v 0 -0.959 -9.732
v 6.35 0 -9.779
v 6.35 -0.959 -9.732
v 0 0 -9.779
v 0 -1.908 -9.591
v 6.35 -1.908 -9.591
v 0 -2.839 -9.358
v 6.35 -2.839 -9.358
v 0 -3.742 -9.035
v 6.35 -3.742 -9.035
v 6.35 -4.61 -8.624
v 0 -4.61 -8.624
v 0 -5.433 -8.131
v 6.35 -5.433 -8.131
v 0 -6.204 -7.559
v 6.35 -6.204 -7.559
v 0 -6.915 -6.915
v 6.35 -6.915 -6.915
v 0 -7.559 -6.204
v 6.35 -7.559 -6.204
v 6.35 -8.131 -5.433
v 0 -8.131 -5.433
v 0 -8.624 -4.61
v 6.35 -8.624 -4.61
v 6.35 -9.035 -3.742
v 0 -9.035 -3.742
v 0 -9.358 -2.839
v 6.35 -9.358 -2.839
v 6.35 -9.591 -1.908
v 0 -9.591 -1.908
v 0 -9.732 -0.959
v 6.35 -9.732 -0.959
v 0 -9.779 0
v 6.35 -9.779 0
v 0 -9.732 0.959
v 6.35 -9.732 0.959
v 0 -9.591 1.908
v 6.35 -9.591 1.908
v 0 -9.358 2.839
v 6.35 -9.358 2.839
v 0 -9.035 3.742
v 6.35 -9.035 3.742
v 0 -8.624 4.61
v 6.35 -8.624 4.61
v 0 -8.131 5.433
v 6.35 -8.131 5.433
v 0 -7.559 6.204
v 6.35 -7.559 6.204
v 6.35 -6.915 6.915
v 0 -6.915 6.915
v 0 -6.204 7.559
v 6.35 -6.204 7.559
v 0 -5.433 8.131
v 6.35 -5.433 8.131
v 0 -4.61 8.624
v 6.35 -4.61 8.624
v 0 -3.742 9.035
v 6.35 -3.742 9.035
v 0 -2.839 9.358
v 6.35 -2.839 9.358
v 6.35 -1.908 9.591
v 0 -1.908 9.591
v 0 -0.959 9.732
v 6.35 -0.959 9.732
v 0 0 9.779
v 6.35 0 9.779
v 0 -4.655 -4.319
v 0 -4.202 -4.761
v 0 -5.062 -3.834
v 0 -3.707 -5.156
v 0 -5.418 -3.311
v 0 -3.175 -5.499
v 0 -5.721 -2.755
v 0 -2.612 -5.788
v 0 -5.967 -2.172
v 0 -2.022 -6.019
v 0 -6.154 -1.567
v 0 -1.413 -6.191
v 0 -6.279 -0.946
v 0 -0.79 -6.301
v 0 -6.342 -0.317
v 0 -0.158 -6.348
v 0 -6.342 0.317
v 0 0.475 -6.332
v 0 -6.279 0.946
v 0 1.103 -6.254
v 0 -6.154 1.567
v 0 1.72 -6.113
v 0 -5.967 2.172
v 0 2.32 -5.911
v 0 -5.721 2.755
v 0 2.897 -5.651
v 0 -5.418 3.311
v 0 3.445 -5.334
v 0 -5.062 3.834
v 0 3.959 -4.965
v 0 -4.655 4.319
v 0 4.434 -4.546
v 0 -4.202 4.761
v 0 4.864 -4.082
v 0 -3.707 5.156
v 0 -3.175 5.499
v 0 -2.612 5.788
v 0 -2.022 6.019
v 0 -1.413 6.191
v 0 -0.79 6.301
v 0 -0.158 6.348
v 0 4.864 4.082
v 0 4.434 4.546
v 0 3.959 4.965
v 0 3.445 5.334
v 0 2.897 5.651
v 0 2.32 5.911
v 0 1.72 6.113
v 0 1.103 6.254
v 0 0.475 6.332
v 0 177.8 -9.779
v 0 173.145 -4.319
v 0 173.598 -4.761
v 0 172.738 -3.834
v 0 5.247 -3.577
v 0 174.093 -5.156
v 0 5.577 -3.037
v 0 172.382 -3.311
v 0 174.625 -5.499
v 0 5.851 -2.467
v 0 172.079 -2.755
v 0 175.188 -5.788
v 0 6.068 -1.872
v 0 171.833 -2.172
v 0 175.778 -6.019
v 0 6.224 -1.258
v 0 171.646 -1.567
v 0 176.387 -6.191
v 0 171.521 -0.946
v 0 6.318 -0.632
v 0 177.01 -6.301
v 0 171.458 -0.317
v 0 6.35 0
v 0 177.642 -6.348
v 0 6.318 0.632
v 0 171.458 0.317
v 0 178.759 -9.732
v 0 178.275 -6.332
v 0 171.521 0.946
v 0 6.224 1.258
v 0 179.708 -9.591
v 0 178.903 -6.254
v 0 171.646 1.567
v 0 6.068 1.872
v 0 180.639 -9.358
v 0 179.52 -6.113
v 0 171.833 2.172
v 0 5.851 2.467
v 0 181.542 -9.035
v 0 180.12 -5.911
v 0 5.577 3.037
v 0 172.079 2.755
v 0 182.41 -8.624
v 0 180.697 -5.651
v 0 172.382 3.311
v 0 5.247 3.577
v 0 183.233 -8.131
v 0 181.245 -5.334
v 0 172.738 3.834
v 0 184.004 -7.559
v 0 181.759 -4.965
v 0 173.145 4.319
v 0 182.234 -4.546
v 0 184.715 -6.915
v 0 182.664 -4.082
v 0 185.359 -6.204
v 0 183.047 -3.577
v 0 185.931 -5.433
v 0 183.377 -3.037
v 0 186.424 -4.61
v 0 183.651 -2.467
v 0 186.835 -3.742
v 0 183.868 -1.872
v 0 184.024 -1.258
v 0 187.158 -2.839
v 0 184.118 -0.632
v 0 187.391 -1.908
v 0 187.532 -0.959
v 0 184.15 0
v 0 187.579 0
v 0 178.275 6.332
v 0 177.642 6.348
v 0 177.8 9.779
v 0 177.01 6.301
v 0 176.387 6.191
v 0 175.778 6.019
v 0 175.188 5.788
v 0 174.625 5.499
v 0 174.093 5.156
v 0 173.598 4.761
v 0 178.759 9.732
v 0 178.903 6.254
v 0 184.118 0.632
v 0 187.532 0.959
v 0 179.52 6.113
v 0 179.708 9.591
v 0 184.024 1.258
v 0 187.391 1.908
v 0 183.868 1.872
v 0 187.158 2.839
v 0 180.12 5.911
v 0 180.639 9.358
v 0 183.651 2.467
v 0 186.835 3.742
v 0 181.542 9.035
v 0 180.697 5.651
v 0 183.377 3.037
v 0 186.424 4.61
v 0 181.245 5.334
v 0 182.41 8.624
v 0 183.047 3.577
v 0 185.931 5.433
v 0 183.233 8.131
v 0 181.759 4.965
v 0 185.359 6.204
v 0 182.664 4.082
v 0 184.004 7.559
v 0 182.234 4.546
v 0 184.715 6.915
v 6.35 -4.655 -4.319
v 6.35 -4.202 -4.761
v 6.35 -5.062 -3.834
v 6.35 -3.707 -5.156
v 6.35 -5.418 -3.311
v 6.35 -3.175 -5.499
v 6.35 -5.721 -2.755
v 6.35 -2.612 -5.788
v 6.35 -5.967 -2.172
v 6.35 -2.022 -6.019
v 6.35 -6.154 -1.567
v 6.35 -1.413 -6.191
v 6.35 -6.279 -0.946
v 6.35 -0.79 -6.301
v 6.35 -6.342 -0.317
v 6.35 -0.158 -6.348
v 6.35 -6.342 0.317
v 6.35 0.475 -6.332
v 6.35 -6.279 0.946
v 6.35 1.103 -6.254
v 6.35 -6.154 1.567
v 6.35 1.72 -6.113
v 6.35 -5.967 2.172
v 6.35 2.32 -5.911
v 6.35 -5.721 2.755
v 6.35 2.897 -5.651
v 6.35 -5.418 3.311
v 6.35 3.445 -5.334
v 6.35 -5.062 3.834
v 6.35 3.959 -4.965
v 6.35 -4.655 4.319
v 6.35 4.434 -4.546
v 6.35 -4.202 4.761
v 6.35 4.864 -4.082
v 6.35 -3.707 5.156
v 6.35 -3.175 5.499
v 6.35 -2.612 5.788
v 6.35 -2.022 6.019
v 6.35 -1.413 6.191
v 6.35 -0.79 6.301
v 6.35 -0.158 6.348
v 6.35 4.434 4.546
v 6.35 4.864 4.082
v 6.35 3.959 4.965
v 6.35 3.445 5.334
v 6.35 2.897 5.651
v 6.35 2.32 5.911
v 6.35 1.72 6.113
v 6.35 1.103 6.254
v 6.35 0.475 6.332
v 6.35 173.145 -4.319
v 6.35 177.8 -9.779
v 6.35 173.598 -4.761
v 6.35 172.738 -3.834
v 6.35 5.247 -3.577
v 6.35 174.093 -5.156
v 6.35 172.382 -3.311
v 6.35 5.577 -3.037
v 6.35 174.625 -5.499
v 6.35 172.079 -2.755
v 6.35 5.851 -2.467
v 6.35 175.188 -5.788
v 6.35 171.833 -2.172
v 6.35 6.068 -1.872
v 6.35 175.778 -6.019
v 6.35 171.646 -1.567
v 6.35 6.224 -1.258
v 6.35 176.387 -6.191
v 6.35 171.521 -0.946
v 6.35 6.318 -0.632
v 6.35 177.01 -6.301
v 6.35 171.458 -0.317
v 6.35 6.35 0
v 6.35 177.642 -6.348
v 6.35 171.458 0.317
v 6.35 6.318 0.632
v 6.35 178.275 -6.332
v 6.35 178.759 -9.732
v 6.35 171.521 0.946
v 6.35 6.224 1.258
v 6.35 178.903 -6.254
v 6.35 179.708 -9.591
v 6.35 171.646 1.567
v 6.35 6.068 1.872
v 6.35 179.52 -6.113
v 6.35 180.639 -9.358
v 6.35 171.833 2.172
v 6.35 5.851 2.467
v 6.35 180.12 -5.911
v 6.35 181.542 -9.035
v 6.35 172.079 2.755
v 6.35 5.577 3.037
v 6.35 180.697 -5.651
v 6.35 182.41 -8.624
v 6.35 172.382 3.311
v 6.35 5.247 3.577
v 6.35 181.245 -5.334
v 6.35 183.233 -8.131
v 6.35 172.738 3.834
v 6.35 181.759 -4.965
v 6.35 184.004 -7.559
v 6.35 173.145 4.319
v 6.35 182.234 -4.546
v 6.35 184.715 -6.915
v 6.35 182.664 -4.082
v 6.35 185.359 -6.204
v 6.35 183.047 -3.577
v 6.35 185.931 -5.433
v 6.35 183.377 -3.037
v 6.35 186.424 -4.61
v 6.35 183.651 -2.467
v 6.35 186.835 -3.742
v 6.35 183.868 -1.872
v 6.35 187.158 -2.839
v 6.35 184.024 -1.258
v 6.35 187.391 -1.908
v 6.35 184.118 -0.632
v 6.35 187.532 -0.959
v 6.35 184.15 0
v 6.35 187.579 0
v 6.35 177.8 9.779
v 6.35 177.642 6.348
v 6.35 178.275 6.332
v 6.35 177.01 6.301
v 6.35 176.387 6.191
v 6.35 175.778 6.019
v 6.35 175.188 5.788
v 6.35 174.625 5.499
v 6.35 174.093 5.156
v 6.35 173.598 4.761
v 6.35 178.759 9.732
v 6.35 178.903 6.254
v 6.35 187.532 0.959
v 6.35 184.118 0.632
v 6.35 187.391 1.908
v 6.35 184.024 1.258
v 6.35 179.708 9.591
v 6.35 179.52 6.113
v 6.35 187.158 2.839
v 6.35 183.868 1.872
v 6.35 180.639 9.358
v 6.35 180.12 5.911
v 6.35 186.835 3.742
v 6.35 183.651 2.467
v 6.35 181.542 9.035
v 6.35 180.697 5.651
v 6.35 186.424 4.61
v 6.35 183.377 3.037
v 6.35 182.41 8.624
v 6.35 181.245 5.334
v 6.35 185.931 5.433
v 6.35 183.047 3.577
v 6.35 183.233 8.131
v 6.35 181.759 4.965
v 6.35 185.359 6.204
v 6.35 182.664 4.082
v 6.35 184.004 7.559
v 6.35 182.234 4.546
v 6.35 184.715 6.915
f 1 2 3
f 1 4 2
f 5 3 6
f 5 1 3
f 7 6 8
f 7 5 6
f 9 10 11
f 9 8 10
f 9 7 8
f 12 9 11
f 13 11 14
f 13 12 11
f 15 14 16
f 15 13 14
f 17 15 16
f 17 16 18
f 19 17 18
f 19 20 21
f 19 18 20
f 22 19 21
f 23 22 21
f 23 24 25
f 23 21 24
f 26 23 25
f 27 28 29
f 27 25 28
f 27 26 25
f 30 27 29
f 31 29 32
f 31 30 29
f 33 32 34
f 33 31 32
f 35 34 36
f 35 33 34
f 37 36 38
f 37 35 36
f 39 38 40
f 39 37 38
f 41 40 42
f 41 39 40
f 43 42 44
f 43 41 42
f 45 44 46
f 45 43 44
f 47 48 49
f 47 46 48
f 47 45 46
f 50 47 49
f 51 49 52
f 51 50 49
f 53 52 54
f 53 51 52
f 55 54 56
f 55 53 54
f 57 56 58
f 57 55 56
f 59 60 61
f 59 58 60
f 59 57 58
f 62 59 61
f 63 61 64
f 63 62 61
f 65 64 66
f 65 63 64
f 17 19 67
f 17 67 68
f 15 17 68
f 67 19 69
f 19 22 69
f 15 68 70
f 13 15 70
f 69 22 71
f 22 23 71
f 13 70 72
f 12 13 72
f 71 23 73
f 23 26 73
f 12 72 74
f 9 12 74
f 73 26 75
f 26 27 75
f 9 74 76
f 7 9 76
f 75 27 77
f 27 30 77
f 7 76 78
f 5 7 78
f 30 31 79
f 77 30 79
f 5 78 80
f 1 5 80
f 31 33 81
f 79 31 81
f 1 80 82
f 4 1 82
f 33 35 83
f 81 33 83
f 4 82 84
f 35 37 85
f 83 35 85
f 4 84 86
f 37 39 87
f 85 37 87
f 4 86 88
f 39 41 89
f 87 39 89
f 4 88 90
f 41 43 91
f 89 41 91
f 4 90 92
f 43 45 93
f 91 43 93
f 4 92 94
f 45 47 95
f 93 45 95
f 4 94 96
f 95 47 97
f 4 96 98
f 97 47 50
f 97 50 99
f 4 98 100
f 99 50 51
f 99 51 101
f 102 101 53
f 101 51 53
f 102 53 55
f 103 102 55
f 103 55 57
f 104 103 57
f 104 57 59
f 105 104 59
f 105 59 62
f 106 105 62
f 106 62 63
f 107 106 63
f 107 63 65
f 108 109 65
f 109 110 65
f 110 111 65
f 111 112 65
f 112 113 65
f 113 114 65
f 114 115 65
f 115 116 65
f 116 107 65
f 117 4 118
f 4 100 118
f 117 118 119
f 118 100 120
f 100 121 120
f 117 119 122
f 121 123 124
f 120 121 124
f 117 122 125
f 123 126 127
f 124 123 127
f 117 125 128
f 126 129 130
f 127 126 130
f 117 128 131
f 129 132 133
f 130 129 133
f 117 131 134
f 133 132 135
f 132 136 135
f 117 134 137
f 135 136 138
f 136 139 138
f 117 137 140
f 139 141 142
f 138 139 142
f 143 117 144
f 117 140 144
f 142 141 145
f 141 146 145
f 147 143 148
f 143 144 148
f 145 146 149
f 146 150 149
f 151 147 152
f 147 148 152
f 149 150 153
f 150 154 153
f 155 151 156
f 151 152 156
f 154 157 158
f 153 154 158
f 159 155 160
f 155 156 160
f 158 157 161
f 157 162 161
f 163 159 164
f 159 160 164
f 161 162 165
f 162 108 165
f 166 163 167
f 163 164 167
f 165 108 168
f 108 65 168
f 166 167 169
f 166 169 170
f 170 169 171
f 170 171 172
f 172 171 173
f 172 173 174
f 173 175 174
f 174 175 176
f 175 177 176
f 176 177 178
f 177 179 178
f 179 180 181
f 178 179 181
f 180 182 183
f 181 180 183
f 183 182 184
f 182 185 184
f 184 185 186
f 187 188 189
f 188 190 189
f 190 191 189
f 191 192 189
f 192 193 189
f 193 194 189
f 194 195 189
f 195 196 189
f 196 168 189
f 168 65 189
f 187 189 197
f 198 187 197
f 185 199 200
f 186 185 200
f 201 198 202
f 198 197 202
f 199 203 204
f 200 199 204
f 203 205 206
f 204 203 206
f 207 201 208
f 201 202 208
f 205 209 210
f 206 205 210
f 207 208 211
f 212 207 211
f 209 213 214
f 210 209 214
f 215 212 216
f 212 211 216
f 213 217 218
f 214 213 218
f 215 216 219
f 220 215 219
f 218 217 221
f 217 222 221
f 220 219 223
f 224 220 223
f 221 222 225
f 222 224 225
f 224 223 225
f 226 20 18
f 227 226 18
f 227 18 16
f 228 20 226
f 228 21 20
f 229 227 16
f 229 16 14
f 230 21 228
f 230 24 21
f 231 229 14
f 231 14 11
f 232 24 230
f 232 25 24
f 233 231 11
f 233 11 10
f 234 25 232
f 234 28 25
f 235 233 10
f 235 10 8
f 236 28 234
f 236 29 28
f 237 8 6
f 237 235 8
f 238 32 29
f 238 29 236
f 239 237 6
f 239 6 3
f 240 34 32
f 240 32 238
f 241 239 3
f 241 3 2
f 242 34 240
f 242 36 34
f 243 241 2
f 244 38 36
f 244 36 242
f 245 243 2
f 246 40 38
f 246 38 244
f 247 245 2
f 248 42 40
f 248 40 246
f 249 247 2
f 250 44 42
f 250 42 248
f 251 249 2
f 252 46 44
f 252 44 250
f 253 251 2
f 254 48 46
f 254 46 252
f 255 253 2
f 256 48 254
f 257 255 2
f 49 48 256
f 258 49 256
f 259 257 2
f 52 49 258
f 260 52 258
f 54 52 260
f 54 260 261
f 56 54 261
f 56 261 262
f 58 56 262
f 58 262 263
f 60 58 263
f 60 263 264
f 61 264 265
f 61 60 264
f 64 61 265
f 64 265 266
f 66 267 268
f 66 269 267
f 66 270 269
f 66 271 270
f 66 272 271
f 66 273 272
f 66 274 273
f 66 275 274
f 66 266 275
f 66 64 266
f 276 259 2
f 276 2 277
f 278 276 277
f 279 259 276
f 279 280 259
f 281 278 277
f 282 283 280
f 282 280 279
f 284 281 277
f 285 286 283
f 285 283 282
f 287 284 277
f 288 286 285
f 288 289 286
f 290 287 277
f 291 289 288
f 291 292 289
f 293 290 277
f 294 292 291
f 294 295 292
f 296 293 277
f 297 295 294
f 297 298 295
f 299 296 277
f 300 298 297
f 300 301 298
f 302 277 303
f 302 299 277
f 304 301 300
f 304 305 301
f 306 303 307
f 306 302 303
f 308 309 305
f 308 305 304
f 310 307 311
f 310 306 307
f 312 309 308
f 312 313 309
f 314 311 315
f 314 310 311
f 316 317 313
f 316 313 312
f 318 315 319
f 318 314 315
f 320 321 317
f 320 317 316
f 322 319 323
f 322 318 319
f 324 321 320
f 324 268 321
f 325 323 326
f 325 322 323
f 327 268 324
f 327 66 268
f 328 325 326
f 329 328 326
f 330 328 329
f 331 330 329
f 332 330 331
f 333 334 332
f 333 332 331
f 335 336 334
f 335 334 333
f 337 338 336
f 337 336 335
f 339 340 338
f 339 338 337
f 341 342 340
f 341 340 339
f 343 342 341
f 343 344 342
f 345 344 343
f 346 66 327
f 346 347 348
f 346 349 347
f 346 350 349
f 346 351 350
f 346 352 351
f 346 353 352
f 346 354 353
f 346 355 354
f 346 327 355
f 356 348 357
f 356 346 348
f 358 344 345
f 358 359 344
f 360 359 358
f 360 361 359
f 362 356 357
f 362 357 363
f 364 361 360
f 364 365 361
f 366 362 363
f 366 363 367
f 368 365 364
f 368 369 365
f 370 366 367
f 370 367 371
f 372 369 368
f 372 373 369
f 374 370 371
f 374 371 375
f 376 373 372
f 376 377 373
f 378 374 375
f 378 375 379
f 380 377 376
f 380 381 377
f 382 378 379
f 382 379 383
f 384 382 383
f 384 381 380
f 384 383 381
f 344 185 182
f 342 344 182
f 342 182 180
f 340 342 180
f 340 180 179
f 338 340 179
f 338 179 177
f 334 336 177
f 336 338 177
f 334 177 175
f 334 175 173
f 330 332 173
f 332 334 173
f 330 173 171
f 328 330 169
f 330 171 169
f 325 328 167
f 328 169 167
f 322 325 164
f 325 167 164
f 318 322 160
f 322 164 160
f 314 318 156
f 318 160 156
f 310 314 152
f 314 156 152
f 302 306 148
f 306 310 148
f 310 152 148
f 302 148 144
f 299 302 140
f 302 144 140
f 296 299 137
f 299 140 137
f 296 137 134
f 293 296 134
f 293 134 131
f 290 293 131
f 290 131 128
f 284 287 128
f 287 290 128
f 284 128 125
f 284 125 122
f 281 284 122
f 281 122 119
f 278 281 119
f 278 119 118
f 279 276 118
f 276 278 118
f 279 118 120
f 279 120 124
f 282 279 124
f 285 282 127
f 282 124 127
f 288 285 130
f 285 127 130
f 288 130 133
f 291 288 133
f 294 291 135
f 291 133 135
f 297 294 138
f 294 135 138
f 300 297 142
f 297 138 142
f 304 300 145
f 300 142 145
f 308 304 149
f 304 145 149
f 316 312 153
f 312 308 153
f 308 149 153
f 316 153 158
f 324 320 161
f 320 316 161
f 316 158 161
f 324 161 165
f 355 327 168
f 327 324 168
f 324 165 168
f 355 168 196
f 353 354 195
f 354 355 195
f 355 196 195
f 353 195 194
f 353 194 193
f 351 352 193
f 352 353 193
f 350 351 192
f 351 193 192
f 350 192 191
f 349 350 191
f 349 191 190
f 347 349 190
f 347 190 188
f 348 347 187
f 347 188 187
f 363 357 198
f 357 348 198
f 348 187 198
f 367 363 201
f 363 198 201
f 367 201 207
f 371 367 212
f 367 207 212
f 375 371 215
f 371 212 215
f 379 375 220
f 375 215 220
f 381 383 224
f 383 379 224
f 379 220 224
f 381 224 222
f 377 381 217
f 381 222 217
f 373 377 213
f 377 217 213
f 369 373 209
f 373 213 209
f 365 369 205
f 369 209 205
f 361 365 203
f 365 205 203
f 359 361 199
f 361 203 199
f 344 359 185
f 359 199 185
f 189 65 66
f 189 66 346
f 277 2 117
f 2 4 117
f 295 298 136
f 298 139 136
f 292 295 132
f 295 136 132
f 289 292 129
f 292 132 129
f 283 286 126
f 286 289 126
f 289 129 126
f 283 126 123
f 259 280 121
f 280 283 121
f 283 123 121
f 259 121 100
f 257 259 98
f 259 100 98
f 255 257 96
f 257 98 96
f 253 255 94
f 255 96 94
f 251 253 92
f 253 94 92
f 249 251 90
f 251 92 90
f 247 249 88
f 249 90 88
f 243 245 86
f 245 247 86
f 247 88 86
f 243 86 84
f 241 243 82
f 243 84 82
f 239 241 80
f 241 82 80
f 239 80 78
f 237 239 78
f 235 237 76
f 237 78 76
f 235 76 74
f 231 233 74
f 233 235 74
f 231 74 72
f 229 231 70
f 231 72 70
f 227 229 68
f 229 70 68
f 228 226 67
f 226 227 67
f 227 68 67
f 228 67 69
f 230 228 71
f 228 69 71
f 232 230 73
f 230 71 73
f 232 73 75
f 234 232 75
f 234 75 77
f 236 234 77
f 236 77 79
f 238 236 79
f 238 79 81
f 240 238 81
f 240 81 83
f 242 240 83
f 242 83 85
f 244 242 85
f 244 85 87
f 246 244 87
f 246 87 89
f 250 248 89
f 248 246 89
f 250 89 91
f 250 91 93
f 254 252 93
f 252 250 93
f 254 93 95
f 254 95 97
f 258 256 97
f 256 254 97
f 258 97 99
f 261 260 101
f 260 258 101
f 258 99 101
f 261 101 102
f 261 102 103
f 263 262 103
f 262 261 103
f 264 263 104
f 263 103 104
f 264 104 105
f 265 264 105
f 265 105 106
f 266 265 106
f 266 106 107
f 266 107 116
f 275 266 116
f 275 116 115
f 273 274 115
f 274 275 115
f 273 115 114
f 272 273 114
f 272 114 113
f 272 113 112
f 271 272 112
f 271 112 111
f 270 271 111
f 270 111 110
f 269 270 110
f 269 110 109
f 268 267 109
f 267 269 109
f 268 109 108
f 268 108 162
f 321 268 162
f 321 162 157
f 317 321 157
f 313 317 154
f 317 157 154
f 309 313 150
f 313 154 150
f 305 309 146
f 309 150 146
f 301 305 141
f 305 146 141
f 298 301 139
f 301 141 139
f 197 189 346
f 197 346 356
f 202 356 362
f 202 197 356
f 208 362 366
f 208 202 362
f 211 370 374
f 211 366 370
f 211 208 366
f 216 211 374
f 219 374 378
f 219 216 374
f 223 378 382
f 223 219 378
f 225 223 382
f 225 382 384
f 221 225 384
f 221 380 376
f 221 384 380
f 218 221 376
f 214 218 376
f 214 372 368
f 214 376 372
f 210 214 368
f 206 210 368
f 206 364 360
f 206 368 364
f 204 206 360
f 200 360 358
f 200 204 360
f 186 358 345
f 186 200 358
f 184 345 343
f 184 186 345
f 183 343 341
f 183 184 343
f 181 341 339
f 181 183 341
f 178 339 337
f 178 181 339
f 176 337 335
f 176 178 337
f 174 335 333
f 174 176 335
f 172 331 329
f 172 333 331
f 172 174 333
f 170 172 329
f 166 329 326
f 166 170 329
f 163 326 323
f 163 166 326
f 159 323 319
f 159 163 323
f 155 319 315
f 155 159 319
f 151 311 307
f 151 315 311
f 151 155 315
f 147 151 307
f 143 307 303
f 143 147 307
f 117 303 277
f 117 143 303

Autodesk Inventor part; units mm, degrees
ref_plane "YZ Plane" through (0, 0, 0) normal (1, 0, 0) x (0, 1, 0)
ref_plane "XZ Plane" through (0, 0, 0) normal (0, 1, 0) x (-1, 0, 0)
ref_plane "XY Plane" through (0, 0, 0) normal (0, 0, 1) x (1, 0, 0)
sketch "Sketch1" plane through (0, 0, 0) normal (1, 0, 0) x (0, 1, 0)
  circle A0 centre (0, 0) radius 6.35
  arc A1 (0, 9.779) -> (0, -9.779) centre (0, 0) ccw
  line L0 (0, 9.779) -> (177.8, 9.779)
  line L1 (0, -9.779) -> (177.8, -9.779)
  arc A2 (177.8, -9.779) -> (177.8, 9.779) centre (177.8, 0) ccw
  circle A3 centre (177.8, 0) radius 6.35
  dimension "d0" = 12.7
  dimension "d1" = 19.558
  dimension "d2" = 177.8
  dimension "d3" = 177.8
  dimension "d4" = 12.7
extrude "Extrusion1" add sketch "Sketch1" along normal blind 6.35
properties part number "RollerArm"
